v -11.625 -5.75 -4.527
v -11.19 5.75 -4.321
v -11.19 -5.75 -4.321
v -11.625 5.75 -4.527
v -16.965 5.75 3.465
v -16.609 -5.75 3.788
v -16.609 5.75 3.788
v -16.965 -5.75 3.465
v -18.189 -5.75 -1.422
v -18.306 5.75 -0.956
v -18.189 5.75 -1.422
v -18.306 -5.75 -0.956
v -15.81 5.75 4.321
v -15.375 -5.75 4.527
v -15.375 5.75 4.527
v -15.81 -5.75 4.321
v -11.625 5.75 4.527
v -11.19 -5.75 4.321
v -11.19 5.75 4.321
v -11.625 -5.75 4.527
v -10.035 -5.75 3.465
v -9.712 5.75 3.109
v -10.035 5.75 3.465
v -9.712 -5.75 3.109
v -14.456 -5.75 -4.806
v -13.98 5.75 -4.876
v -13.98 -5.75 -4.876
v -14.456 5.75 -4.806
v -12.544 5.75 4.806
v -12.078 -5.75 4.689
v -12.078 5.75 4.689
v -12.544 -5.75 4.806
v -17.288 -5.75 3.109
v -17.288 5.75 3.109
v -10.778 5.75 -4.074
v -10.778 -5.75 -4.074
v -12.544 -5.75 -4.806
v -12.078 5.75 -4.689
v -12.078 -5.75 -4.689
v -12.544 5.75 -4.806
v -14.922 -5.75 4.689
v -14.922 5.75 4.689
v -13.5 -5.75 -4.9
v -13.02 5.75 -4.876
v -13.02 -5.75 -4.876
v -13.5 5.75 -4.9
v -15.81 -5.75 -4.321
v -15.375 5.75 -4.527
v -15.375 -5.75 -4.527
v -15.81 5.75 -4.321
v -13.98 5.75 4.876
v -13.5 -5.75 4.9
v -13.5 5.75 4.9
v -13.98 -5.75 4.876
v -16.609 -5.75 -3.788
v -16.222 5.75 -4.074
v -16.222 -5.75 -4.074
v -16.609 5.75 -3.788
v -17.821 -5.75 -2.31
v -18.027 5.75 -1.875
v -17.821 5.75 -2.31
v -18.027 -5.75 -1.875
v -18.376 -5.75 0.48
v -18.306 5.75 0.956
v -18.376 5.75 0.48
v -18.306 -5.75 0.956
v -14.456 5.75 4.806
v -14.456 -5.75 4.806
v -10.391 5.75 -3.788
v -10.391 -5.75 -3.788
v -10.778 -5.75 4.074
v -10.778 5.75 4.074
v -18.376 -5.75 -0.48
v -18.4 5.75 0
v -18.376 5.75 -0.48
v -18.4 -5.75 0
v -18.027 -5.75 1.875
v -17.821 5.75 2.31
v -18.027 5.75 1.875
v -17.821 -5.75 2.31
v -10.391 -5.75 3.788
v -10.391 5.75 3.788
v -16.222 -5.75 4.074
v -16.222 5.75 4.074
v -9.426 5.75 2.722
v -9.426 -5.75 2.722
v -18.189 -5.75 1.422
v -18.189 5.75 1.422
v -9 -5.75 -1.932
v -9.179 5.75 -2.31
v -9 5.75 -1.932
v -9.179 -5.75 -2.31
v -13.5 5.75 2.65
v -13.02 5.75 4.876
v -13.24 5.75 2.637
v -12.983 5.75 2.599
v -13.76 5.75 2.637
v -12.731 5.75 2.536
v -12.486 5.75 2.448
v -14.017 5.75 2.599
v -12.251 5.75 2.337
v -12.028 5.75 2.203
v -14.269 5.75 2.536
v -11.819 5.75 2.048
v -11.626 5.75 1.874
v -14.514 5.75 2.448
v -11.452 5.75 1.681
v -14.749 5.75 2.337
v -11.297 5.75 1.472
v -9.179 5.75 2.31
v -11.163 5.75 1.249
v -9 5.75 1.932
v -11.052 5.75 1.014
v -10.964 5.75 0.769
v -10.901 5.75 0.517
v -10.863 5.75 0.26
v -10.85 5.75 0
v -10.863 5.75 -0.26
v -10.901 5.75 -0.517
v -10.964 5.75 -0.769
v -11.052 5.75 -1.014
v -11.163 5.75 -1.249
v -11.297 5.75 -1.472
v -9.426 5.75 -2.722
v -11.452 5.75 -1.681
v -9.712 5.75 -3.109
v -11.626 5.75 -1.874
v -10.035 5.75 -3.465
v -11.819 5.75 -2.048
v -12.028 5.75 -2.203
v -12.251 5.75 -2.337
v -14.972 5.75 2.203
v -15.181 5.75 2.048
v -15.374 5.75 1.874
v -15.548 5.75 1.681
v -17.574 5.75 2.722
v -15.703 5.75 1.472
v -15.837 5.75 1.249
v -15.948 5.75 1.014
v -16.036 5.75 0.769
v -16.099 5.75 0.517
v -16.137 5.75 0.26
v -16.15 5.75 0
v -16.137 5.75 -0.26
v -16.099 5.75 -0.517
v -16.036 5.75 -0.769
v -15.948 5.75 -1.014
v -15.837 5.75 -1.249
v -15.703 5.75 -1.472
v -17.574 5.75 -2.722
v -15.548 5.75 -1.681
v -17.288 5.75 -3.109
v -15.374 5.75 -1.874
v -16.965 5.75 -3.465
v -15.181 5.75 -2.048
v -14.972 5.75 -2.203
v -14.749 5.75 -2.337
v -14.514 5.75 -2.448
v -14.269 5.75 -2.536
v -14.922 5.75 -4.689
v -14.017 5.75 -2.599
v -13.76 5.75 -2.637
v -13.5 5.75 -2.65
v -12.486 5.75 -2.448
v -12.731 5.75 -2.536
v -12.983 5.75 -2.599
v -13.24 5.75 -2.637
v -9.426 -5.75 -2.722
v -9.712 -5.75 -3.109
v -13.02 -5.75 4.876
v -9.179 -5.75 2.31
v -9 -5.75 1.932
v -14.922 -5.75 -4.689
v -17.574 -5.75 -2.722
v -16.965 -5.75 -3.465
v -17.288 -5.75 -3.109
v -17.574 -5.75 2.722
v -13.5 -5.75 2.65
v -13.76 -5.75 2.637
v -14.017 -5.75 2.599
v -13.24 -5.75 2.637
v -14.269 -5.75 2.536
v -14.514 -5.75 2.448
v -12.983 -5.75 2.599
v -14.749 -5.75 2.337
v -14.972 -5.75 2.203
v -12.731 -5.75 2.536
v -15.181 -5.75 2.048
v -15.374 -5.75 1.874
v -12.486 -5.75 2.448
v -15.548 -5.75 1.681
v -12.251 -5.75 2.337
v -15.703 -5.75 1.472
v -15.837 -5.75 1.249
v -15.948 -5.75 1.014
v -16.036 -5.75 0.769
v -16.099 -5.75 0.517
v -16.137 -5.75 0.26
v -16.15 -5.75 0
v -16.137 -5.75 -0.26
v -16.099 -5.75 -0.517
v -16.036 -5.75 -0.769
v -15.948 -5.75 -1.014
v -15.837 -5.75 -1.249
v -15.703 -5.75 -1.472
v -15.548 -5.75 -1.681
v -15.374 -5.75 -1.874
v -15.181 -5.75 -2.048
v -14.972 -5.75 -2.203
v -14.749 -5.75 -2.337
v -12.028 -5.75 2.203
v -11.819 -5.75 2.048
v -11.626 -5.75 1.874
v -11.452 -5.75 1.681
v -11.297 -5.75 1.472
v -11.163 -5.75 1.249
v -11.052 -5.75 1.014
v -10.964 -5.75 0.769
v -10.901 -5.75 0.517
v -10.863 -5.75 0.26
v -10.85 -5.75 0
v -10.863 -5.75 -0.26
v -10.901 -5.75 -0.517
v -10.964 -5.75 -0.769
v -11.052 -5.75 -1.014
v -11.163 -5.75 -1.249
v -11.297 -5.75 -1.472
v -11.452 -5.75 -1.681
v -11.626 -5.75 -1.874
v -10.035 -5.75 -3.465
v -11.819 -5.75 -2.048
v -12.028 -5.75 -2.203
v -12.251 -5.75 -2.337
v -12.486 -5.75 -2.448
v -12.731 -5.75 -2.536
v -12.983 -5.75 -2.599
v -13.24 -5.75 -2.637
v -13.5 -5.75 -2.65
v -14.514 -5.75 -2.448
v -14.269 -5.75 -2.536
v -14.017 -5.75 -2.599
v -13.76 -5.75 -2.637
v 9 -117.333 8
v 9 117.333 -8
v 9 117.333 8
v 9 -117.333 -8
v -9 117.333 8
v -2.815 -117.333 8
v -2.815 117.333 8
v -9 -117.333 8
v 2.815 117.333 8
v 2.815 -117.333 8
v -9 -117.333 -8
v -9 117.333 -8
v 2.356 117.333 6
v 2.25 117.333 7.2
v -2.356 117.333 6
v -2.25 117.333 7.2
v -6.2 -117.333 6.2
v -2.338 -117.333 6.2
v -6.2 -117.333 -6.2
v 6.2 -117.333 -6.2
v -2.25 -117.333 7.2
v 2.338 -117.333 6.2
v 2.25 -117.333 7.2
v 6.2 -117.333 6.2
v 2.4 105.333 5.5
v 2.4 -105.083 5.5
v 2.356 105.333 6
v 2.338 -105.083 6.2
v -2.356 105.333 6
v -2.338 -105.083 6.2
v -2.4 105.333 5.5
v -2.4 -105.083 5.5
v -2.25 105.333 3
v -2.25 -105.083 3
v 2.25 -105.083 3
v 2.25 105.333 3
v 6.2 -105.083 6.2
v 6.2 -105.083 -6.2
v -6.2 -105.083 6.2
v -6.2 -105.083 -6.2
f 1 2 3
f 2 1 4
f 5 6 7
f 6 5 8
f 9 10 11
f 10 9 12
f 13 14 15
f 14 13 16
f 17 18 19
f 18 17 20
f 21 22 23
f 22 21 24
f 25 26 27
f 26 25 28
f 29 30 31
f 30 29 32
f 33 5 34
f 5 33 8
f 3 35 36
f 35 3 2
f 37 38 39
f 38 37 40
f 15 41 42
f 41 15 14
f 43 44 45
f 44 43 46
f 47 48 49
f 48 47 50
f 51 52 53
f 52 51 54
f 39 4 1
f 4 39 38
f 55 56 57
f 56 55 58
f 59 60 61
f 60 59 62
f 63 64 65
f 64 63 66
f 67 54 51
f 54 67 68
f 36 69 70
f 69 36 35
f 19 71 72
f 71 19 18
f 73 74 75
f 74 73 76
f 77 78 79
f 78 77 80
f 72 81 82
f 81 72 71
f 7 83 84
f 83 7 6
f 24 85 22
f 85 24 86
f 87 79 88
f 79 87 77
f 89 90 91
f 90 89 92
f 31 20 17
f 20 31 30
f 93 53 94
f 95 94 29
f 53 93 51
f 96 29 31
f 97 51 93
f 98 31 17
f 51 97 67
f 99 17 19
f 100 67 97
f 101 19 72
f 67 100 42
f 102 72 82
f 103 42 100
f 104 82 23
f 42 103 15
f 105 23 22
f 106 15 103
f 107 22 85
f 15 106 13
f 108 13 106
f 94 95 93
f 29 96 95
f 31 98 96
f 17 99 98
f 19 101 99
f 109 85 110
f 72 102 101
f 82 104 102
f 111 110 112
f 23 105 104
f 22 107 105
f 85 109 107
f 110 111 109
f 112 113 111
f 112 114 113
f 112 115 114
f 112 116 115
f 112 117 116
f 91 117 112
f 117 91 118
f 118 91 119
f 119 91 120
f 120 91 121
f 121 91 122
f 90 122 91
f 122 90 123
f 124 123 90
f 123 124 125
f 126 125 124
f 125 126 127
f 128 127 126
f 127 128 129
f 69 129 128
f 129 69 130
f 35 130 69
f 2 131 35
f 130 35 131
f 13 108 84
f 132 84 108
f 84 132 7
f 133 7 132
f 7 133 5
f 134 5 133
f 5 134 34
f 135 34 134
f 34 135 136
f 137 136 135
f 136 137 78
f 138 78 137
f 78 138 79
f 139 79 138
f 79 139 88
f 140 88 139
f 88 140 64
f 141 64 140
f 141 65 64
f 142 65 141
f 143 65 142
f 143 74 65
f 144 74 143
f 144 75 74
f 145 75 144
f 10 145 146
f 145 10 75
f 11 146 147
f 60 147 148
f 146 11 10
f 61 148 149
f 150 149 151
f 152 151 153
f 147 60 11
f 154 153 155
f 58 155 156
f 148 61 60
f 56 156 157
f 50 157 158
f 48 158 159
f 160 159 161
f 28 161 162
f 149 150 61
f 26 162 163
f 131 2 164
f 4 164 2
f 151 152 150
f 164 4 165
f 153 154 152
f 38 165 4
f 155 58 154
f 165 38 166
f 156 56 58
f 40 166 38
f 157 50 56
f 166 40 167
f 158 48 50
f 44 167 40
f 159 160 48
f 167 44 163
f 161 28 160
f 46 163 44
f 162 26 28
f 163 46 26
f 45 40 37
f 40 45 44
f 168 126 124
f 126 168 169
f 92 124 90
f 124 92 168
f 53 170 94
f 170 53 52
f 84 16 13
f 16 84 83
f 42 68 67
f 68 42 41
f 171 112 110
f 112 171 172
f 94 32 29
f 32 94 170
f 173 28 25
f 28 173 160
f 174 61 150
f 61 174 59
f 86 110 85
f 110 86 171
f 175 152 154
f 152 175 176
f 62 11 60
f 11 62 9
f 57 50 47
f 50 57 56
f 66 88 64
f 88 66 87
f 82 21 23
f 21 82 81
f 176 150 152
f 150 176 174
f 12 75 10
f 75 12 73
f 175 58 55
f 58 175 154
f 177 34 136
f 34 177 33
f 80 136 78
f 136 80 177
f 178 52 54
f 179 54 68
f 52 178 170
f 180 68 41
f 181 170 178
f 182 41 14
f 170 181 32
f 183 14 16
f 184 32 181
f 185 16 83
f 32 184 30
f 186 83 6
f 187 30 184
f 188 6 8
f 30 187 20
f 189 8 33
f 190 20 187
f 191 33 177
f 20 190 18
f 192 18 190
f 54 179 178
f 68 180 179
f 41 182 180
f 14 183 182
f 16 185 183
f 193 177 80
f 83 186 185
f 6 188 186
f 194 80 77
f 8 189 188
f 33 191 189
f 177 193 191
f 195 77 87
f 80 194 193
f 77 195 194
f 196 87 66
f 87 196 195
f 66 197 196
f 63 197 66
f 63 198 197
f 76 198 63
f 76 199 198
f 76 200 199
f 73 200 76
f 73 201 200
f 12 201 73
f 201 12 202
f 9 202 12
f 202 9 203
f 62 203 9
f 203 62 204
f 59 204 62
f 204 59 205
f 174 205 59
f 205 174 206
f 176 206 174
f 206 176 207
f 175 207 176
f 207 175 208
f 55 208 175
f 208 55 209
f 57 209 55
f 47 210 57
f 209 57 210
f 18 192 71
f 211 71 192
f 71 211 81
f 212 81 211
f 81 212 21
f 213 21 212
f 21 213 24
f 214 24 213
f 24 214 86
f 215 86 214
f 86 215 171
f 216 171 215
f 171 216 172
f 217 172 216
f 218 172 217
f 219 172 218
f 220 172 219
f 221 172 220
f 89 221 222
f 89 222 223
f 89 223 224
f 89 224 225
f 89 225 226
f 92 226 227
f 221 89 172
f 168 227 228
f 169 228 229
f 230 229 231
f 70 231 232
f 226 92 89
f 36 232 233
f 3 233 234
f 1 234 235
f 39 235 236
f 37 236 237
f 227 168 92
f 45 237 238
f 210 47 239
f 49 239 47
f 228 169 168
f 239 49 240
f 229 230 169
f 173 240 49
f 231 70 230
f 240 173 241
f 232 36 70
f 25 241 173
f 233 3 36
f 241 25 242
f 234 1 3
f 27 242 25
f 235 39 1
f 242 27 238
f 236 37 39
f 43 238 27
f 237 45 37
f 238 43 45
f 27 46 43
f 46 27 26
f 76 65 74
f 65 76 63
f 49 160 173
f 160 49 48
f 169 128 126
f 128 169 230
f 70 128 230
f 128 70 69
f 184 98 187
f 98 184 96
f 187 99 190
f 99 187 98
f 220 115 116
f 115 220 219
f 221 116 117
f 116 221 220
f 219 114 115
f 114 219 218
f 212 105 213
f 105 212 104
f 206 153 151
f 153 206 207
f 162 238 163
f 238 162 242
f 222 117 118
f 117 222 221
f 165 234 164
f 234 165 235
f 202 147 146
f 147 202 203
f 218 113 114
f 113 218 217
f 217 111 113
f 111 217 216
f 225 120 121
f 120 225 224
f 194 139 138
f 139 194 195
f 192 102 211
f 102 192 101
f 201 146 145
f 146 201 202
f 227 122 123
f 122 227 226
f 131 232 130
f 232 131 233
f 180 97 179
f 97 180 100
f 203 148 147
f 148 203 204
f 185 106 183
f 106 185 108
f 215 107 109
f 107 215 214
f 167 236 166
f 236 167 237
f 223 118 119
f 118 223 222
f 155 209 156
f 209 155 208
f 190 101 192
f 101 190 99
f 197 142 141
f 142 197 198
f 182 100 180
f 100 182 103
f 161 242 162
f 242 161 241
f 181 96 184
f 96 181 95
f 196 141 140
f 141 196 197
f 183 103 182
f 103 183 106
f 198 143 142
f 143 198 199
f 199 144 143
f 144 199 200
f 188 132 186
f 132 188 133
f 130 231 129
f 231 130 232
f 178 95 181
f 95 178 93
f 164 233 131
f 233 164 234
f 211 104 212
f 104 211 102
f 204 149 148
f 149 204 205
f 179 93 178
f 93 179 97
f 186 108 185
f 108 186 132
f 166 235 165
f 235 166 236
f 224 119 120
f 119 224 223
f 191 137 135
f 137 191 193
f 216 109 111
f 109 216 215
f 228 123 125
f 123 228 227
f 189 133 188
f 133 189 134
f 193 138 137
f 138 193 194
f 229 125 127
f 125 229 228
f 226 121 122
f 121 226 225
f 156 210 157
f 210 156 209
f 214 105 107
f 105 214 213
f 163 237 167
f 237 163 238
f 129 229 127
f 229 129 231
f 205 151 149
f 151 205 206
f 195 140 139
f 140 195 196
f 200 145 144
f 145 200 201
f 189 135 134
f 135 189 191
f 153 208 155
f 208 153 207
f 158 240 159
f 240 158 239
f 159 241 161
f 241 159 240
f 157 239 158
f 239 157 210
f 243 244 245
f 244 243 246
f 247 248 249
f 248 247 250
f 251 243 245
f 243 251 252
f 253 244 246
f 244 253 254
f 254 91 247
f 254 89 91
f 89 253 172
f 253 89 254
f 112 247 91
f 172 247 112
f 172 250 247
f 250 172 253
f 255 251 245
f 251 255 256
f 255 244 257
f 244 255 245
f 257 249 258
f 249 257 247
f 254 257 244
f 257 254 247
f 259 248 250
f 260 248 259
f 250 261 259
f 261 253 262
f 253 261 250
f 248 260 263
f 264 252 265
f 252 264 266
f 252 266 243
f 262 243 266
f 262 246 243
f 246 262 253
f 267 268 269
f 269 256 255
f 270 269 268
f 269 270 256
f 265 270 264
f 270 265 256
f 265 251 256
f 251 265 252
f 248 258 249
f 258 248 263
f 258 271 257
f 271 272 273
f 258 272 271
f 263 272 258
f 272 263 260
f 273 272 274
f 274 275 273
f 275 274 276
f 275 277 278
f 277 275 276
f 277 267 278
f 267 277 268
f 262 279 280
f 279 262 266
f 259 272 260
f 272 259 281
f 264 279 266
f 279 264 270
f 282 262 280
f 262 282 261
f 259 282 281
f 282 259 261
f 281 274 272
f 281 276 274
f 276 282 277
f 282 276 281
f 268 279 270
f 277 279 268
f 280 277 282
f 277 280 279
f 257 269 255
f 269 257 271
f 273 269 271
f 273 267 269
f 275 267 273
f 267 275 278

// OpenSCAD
// file: ../modules/hinge.scad
// ====================================================================
// Integrated 3D Printable Hinge Module
// Pin-and-barrel knuckle hinge for French doors and top roof doors
// ====================================================================
include <../config.scad>

// Female Hinge Knuckle (mounted to frame pillar)
module hinge_female_knuckle(
    barrel_od = 10.0,
    pin_id = 5.0,
    height = 28.0,
    center_gap = 12.0
) {
    difference() {
        cylinder(d = barrel_od, h = height, center = true);
        
        // Center cutout for male knuckle
        cube([barrel_od + 2, barrel_od + 2, center_gap + 2*TOL_HINGE], center = true);
        
        // Through-hole for hinge pin
        cylinder(d = pin_id + TOL_HINGE, h = height + 4, center = true);
    }
}

// Male Hinge Knuckle (mounted to door frame)
module hinge_male_knuckle(
    barrel_od = 10.0,
    pin_id = 5.0,
    knuckle_h = 11.5
) {
    difference() {
        cylinder(d = barrel_od - 0.2, h = knuckle_h, center = true);
        
        // Through-hole for hinge pin
        cylinder(d = pin_id + TOL_HINGE, h = knuckle_h + 2, center = true);
    }
}

// Dedicated 3D Printable Hinge Pin with Retention Head
module hinge_pin(
    pin_id = 5.0,
    length = 32.0
) {
    union() {
        // Main pin shaft
        cylinder(d = pin_id - TOL_HINGE, h = length, center = true);
        
        // Chamfered tip for easy alignment insertion
        translate([0, 0, length/2])
        cylinder(r1 = (pin_id - TOL_HINGE)/2, r2 = (pin_id - TOL_HINGE)/2 - 0.8, h = 2, center = false);
        
        // Retention cap
        translate([0, 0, -length/2 - 2])
        cylinder(d = pin_id + 4, h = 2.5, center = false);
    }
}
// file: ../modules/spline_profile.scad
// ====================================================================
// Cellophane Spline Groove & Compliant Spring Clamping Strip Module
// High-tension retention system with compliant split-core spring prongs
// and directional grip teeth to hold cellophane drum-tight without slipping
// ====================================================================
include <../config.scad>

// Negative volume for cutting the spline groove into any beam surface
// Cuts into the -Z direction from Z=0.
// Axis parameter: "Y" (default) or "X"
module spline_groove_negative(length = 100, axis = "Y") {
    gw = GROOVE_WIDTH; // 4.5 mm
    gd = GROOVE_DEPTH; // 5.0 mm
    
    // Cross-section profile of the groove (in X-Z plane)
    // Features a 45° lead-in chamfer at the mouth and internal retention undercuts
    module groove_cross_section_2d() {
        polygon(points = [
            [-(gw/2 + 0.6),  0.05], // Mouth chamfer outer left
            [-gw/2,         -0.80], // Mouth chamfer inner left
            [-gw/2 - 0.15,  -2.50], // Mid retention undercut left
            [-gw/2,         -gd],   // Bottom left
            [ gw/2,         -gd],   // Bottom right
            [ gw/2 + 0.15,  -2.50], // Mid retention undercut right
            [ gw/2,         -0.80], // Mouth chamfer inner right
            [ (gw/2 + 0.6),  0.05]  // Mouth chamfer outer right
        ]);
    }
    
    if (axis == "Y") {
        rotate([90, 0, 0])
        linear_extrude(height = length, center = true) {
            groove_cross_section_2d();
        }
    } else {
        rotate([0, 90, 0])
        rotate([0, 0, 90])
        linear_extrude(height = length, center = true) {
            groove_cross_section_2d();
        }
    }
}

// 2D Profile of the Compliant Spring-Wedge Spline Clip (X-Z plane)
// Has a central vertical expansion slot that allows the two prongs to flex inward
// during insertion and exert continuous outward spring pressure against the cellophane.
module spline_clip_profile_2d(width_offset = 0) {
    w_cap   = 7.0; // Top thumb-press cap width
    h_cap   = 1.8; // Cap thickness
    h_depth = 4.6; // Insertion depth
    
    // Base dimensions + user/grip offset
    w_shaft = 4.3 + width_offset; // Base shaft (tight fit in 4.5mm groove)
    w_barb1 = 4.7 + width_offset; // Upper retention barb (interferes with groove)
    w_barb2 = 4.8 + width_offset; // Lower primary clamping barb
    w_nose  = 3.2;                // Lead-in nose
    
    difference() {
        union() {
            // 1. Top Thumb-Press Cap (acts as depth stop & pry lip)
            translate([0, h_cap / 2])
            hull() {
                translate([-w_cap/2 + 0.8, -h_cap/2 + 0.4]) circle(r = 0.4, $fn=16);
                translate([ w_cap/2 - 0.8, -h_cap/2 + 0.4]) circle(r = 0.4, $fn=16);
                translate([-w_cap/2 + 1.2,  h_cap/2 - 0.4]) circle(r = 0.4, $fn=16);
                translate([ w_cap/2 - 1.2,  h_cap/2 - 0.4]) circle(r = 0.4, $fn=16);
            }
            
            // 2. Dual-Barb Clamping Prongs
            polygon(points = [
                [-w_shaft/2,        0.0],
                [-w_shaft/2,       -1.2],
                [-w_barb1/2,       -1.9], // Upper barb tooth
                [-w_shaft/2,       -2.1],
                [-w_shaft/2,       -2.8],
                [-w_barb2/2,       -3.5], // Lower primary clamping tooth
                [-w_nose/2,        -h_depth], // Tapered nose
                [ w_nose/2,        -h_depth],
                [ w_barb2/2,       -3.5],
                [ w_shaft/2,       -2.8],
                [ w_shaft/2,       -2.1],
                [ w_barb1/2,       -1.9],
                [ w_shaft/2,       -1.2],
                [ w_shaft/2,        0.0]
            ]);
        }
        
        // 3. Central Vertical Expansion Kerf (0.9 mm compliant flex slot)
        // Splits the shaft into two spring prongs that flex inward upon insertion
        translate([0, -h_depth/2 - 0.6])
        hull() {
            translate([0,  h_depth/2 - 1.2]) circle(r = 0.45, $fn=16);
            translate([0, -h_depth/2 + 0.5]) circle(r = 0.45, $fn=16);
        }
    }
}

// 3D Snap-in Locking Spline Clip (oriented along Y axis by default)
module spline_clip(length = 150, axis = "Y", width_offset = 0) {
    if (axis == "Y") {
        rotate([90, 0, 0])
        linear_extrude(height = length, center = true) {
            spline_clip_profile_2d(width_offset = width_offset);
        }
    } else {
        rotate([0, 90, 0])
        rotate([0, 0, 90])
        linear_extrude(height = length, center = true) {
            spline_clip_profile_2d(width_offset = width_offset);
        }
    }
}
// file: ../config.scad
// ====================================================================
// Bambu Lab A1 Enclosure - Global Configuration Parameters
// 100% 3D Printable, Hardware-Free Modular Enclosure
// ====================================================================

// --- Print Bed Limits ---
MAX_PRINT_X = 256;
MAX_PRINT_Y = 256;
MAX_PRINT_Z = 256;
SAFE_PART_MAX_LEN = 240; // Safety margin for brim and skirt

// --- Internal Enclosure Dimensions (mm) ---
// Sized for Bambu Lab A1 bed-slinger travel, right poop bucket, and top BMCU 370c
INTERNAL_WIDTH  = 560; // X axis clearance (A1 + toolhead + right poop bucket)
INTERNAL_DEPTH  = 580; // Y axis clearance (Bed travel + rear cable loop buffer)
INTERNAL_HEIGHT = 710; // Z axis clearance (Gantry + BMCU 370c rotating mount + spool)

// --- Frame Profile Dimensions ---
BEAM_WIDTH  = 24;  // Beam thickness X/Y (mm)
BEAM_HEIGHT = 24;  // Beam thickness Z (mm)
WALL_THICKNESS = 3.2; // Shell thickness for robust frame rigidity

// Outer Dimensions
OUTER_WIDTH  = INTERNAL_WIDTH  + 2 * BEAM_WIDTH;  // ~608 mm
OUTER_DEPTH  = INTERNAL_DEPTH  + 2 * BEAM_WIDTH;  // ~628 mm
OUTER_HEIGHT = INTERNAL_HEIGHT + 2 * BEAM_HEIGHT; // ~758 mm

// --- Tolerances (FDM 3D Printing tuned for Bambu Lab A1 0.4mm nozzle) ---
TOL_TIGHT    = 0.15; // Tight press fit (spline clips)
TOL_DOVETAIL = 0.20; // Sliding interlock fit (dovetails & taper pins)
TOL_HINGE    = 0.30; // Free rotating hinge pins
TOL_LOOSE    = 0.40; // Clearance gaps

// --- Cellophane Spline Groove Specifications ---
GROOVE_WIDTH  = 4.5; // Width of U-channel on outer beam faces
GROOVE_DEPTH  = 5.0; // Depth of U-channel
SPLINE_WIDTH  = 4.2; // Width of snap-in locking spline strip
SPLINE_HEIGHT = 4.8; // Height of locking spline strip
SPLINE_LIP_R  = 0.6; // Small retention bead radius to pinch cellophane

// --- Tapered Dovetail & Pin Specifications ---
DOVETAIL_DEPTH  = 16.0; // Length of dovetail insert (mm)
DOVETAIL_BASE_W = 14.0; // Width at base of male dovetail
DOVETAIL_TIP_W  = 8.0;  // Width at narrowest point of taper
PIN_HOLE_DIA    = 6.0;  // Transverse locking pin hole diameter (tapered)
PIN_TAPER_ANGLE = 4.0;  // Degrees taper on locking pin for wedge action

// --- Segmentation Calculations (All segments < SAFE_PART_MAX_LEN) ---
CORNER_BLOCK_SIZE = 36; // 3-way cubic corner junction dimension

// Beam span between corners:
SPAN_X = INTERNAL_WIDTH  + 2 * BEAM_WIDTH - 2 * CORNER_BLOCK_SIZE;  // 608 - 72 = 536 mm
SPAN_Y = INTERNAL_DEPTH  + 2 * BEAM_WIDTH - 2 * CORNER_BLOCK_SIZE;  // 628 - 72 = 556 mm
SPAN_Z = INTERNAL_HEIGHT + 2 * BEAM_HEIGHT - 2 * CORNER_BLOCK_SIZE; // 758 - 72 = 686 mm

// Number of segments per span:
NUM_SEGS_X = 3; // 536 / 3 = 178.67 mm per segment
NUM_SEGS_Y = 3; // 556 / 3 = 185.33 mm per segment
NUM_SEGS_Z = 3; // 686 / 3 = 228.67 mm per segment

SEG_LEN_X = SPAN_X / NUM_SEGS_X;
SEG_LEN_Y = SPAN_Y / NUM_SEGS_Y;
SEG_LEN_Z = SPAN_Z / NUM_SEGS_Z;

// --- Filament PTFE Tube Routing (Bottom Side Beam) ---
PTFE_TUBE_OD  = 4.0; // Standard PTFE bowden tube outer diameter (mm)
PTFE_HOLE_DIA = 4.3; // Slip-fit through-hole diameter with retention grip
PTFE_TUBE_CNT = 4;   // 4 dedicated filament tubes for multi-material / drybox
PTFE_ANGLE    = 35;  // Upward angle toward toolhead/BMCU (degrees)

// --- Render Quality ($fn) ---
$fn = $preview ? 24 : 64;
// main file
// ====================================================================
// Dual French Front Doors (Left & Right)
// Modular rigid door leaves with perimeter cellophane spline grooves
// Every piece <= 240 mm (comfortably printable on Bambu Lab A1)
// Cellophane is mounted directly ON THE DOORS, not the front frame!
// ====================================================================
include <../config.scad>
use <../modules/spline_profile.scad>
use <../modules/hinge.scad>

DOOR_LEAF_W = (INTERNAL_WIDTH / 2) - 4.0; // ~276 mm per door leaf
DOOR_LEAF_H = INTERNAL_HEIGHT - 6.0;      // ~704 mm total height
D_PROFILE_W = 18.0; // Width of door frame strut across face
D_PROFILE_T = 16.0; // Thickness of door frame strut

// ----------------------------------------------------
// 1. Rigid Corner Mortise Joint (Connects rails to stiles)
// ----------------------------------------------------
module door_corner_tenon() {
    // 10mm wide x 12mm deep tongue centered in profile
    translate([0, 6, 0])
    cube([D_PROFILE_W - 6, 12, D_PROFILE_T - 4], center = true);
}

module door_corner_mortise() {
    translate([0, 6, 0])
    cube([D_PROFILE_W - 6 + 2*TOL_DOVETAIL, 12.5, D_PROFILE_T - 4 + 2*TOL_DOVETAIL], center = true);
}

// ----------------------------------------------------
// 2. Door Horizontal Rail (Top or Bottom Crossbar)
// Fits diagonally on A1 bed (276mm < 362mm diagonal),
// or can be split into two 138mm halves.
// ----------------------------------------------------
module door_rail(length = DOOR_LEAF_W, is_top = true) {
    difference() {
        cube([length, D_PROFILE_W, D_PROFILE_T], center = true);
        
        // Spline groove on FRONT (+Z) face along X axis
        translate([0, 0, D_PROFILE_T/2])
        spline_groove_negative(length = length - 2*D_PROFILE_W + 2, axis = "X");
        
        // Corner mortise pockets at both ends (to receive stiles)
        translate([-length/2, 0, 0])
        rotate([0, 0, -90])
        door_corner_mortise();
        
        translate([length/2, 0, 0])
        rotate([0, 0, 90])
        door_corner_mortise();
    }
}

// ----------------------------------------------------
// 3. Door Vertical Stile Segment (Outer Hinge Stile or Inner Meeting Stile)
// Split into 3 segments (~234 mm each) to easily print straight on A1 bed
// ----------------------------------------------------
module door_stile_segment(
    length = DOOR_LEAF_H / 3,
    is_outer_hinge = true,
    is_left_door = true,
    has_hinge = true,
    is_top_segment = false,
    is_bottom_segment = false
) {
    difference() {
        union() {
            // Main stile beam body
            cube([D_PROFILE_W, length, D_PROFILE_T], center = true);
            
            // Integrated Male Hinge Knuckle on outer edge
            if (is_outer_hinge && has_hinge) {
                // Knuckle projects from outer edge
                translate([-D_PROFILE_W/2 - 4.5, 0, 0])
                rotate([90, 0, 0])
                hinge_male_knuckle();
            }
            
            // Overlap draft baffle flange on inner meeting stile (Left door only)
            if (!is_outer_hinge && is_left_door) {
                translate([D_PROFILE_W/2 + 4.0, 0, -D_PROFILE_T/4])
                cube([8.0, length, D_PROFILE_T/2], center = true);
            }
            
            // Tenons at top and bottom ends for corner connections
            if (is_top_segment) {
                translate([0, length/2, 0])
                rotate([0, 0, 180])
                door_corner_tenon();
            }
            if (is_bottom_segment) {
                translate([0, -length/2, 0])
                door_corner_tenon();
            }
        }
        
        // Spline groove on FRONT (+Z) face along Y axis
        translate([0, 0, D_PROFILE_T/2])
        spline_groove_negative(length = length + 2, axis = "Y");
        
        // Segment-to-segment alignment mortise at joint ends
        if (!is_bottom_segment) {
            translate([0, -length/2, 0])
            door_corner_mortise();
        }
    }
    
    // Segment-to-segment alignment tenon
    if (!is_top_segment) {
        translate([0, length/2, 0])
        rotate([0, 0, 180])
        door_corner_tenon();
    }
}

// ----------------------------------------------------
// 4. Ergonomic Handle & Magnetic/Ball Latch
// ----------------------------------------------------
module door_handle_latch() {
    difference() {
        union() {
            // Sleeve body to slide over inner door stile
            cube([D_PROFILE_W + 3, 50, D_PROFILE_T + 3], center = true);
            
            // Ergonomic pull handle
            translate([18, 0, 0])
            hull() {
                translate([0, -16, 0]) sphere(r = 5);
                translate([0,  16, 0]) sphere(r = 5);
                translate([10,  0, 0]) sphere(r = 6);
            }
            
            // Spring snap ball detent on latch edge
            translate([-D_PROFILE_W/2 - 4, 0, 0])
            sphere(r = 3.5);
        }
        
        // Center hollow slot for stile
        cube([D_PROFILE_W + TOL_TIGHT, 50.2, D_PROFILE_T + TOL_TIGHT], center = true);
    }
}

// ----------------------------------------------------
// 5. Complete Door Leaf Assembly Preview
// ----------------------------------------------------
module full_door_leaf_preview(is_left = true) {
    color([0.2, 0.6, 0.85, 0.9]) {
        // Top Rail
        translate([DOOR_LEAF_W/2, DOOR_LEAF_H/2 - D_PROFILE_W/2, 0])
        door_rail(length = DOOR_LEAF_W, is_top = true);
        
        // Bottom Rail
        translate([DOOR_LEAF_W/2, -DOOR_LEAF_H/2 + D_PROFILE_W/2, 0])
        door_rail(length = DOOR_LEAF_W, is_top = false);
        
        // Outer Hinge Stile (3 segments)
        seg_h = DOOR_LEAF_H / 3;
        for (i = [-1 : 1]) {
            translate([D_PROFILE_W/2, i * seg_h, 0])
            door_stile_segment(
                length = seg_h,
                is_outer_hinge = true,
                is_left_door = is_left,
                has_hinge = true,
                is_top_segment = (i == 1),
                is_bottom_segment = (i == -1)
            );
        }
        
        // Inner Meeting Stile (3 segments)
        for (i = [-1 : 1]) {
            translate([DOOR_LEAF_W - D_PROFILE_W/2, i * seg_h, 0])
            door_stile_segment(
                length = seg_h,
                is_outer_hinge = false,
                is_left_door = is_left,
                has_hinge = false,
                is_top_segment = (i == 1),
                is_bottom_segment = (i == -1)
            );
        }
        
        // Handle
        translate([DOOR_LEAF_W - D_PROFILE_W/2, 0, 0])
        door_handle_latch();
    }
}

// Default preview: single printable stile segment with hinge
door_stile_segment(is_outer_hinge = true, has_hinge = true);
